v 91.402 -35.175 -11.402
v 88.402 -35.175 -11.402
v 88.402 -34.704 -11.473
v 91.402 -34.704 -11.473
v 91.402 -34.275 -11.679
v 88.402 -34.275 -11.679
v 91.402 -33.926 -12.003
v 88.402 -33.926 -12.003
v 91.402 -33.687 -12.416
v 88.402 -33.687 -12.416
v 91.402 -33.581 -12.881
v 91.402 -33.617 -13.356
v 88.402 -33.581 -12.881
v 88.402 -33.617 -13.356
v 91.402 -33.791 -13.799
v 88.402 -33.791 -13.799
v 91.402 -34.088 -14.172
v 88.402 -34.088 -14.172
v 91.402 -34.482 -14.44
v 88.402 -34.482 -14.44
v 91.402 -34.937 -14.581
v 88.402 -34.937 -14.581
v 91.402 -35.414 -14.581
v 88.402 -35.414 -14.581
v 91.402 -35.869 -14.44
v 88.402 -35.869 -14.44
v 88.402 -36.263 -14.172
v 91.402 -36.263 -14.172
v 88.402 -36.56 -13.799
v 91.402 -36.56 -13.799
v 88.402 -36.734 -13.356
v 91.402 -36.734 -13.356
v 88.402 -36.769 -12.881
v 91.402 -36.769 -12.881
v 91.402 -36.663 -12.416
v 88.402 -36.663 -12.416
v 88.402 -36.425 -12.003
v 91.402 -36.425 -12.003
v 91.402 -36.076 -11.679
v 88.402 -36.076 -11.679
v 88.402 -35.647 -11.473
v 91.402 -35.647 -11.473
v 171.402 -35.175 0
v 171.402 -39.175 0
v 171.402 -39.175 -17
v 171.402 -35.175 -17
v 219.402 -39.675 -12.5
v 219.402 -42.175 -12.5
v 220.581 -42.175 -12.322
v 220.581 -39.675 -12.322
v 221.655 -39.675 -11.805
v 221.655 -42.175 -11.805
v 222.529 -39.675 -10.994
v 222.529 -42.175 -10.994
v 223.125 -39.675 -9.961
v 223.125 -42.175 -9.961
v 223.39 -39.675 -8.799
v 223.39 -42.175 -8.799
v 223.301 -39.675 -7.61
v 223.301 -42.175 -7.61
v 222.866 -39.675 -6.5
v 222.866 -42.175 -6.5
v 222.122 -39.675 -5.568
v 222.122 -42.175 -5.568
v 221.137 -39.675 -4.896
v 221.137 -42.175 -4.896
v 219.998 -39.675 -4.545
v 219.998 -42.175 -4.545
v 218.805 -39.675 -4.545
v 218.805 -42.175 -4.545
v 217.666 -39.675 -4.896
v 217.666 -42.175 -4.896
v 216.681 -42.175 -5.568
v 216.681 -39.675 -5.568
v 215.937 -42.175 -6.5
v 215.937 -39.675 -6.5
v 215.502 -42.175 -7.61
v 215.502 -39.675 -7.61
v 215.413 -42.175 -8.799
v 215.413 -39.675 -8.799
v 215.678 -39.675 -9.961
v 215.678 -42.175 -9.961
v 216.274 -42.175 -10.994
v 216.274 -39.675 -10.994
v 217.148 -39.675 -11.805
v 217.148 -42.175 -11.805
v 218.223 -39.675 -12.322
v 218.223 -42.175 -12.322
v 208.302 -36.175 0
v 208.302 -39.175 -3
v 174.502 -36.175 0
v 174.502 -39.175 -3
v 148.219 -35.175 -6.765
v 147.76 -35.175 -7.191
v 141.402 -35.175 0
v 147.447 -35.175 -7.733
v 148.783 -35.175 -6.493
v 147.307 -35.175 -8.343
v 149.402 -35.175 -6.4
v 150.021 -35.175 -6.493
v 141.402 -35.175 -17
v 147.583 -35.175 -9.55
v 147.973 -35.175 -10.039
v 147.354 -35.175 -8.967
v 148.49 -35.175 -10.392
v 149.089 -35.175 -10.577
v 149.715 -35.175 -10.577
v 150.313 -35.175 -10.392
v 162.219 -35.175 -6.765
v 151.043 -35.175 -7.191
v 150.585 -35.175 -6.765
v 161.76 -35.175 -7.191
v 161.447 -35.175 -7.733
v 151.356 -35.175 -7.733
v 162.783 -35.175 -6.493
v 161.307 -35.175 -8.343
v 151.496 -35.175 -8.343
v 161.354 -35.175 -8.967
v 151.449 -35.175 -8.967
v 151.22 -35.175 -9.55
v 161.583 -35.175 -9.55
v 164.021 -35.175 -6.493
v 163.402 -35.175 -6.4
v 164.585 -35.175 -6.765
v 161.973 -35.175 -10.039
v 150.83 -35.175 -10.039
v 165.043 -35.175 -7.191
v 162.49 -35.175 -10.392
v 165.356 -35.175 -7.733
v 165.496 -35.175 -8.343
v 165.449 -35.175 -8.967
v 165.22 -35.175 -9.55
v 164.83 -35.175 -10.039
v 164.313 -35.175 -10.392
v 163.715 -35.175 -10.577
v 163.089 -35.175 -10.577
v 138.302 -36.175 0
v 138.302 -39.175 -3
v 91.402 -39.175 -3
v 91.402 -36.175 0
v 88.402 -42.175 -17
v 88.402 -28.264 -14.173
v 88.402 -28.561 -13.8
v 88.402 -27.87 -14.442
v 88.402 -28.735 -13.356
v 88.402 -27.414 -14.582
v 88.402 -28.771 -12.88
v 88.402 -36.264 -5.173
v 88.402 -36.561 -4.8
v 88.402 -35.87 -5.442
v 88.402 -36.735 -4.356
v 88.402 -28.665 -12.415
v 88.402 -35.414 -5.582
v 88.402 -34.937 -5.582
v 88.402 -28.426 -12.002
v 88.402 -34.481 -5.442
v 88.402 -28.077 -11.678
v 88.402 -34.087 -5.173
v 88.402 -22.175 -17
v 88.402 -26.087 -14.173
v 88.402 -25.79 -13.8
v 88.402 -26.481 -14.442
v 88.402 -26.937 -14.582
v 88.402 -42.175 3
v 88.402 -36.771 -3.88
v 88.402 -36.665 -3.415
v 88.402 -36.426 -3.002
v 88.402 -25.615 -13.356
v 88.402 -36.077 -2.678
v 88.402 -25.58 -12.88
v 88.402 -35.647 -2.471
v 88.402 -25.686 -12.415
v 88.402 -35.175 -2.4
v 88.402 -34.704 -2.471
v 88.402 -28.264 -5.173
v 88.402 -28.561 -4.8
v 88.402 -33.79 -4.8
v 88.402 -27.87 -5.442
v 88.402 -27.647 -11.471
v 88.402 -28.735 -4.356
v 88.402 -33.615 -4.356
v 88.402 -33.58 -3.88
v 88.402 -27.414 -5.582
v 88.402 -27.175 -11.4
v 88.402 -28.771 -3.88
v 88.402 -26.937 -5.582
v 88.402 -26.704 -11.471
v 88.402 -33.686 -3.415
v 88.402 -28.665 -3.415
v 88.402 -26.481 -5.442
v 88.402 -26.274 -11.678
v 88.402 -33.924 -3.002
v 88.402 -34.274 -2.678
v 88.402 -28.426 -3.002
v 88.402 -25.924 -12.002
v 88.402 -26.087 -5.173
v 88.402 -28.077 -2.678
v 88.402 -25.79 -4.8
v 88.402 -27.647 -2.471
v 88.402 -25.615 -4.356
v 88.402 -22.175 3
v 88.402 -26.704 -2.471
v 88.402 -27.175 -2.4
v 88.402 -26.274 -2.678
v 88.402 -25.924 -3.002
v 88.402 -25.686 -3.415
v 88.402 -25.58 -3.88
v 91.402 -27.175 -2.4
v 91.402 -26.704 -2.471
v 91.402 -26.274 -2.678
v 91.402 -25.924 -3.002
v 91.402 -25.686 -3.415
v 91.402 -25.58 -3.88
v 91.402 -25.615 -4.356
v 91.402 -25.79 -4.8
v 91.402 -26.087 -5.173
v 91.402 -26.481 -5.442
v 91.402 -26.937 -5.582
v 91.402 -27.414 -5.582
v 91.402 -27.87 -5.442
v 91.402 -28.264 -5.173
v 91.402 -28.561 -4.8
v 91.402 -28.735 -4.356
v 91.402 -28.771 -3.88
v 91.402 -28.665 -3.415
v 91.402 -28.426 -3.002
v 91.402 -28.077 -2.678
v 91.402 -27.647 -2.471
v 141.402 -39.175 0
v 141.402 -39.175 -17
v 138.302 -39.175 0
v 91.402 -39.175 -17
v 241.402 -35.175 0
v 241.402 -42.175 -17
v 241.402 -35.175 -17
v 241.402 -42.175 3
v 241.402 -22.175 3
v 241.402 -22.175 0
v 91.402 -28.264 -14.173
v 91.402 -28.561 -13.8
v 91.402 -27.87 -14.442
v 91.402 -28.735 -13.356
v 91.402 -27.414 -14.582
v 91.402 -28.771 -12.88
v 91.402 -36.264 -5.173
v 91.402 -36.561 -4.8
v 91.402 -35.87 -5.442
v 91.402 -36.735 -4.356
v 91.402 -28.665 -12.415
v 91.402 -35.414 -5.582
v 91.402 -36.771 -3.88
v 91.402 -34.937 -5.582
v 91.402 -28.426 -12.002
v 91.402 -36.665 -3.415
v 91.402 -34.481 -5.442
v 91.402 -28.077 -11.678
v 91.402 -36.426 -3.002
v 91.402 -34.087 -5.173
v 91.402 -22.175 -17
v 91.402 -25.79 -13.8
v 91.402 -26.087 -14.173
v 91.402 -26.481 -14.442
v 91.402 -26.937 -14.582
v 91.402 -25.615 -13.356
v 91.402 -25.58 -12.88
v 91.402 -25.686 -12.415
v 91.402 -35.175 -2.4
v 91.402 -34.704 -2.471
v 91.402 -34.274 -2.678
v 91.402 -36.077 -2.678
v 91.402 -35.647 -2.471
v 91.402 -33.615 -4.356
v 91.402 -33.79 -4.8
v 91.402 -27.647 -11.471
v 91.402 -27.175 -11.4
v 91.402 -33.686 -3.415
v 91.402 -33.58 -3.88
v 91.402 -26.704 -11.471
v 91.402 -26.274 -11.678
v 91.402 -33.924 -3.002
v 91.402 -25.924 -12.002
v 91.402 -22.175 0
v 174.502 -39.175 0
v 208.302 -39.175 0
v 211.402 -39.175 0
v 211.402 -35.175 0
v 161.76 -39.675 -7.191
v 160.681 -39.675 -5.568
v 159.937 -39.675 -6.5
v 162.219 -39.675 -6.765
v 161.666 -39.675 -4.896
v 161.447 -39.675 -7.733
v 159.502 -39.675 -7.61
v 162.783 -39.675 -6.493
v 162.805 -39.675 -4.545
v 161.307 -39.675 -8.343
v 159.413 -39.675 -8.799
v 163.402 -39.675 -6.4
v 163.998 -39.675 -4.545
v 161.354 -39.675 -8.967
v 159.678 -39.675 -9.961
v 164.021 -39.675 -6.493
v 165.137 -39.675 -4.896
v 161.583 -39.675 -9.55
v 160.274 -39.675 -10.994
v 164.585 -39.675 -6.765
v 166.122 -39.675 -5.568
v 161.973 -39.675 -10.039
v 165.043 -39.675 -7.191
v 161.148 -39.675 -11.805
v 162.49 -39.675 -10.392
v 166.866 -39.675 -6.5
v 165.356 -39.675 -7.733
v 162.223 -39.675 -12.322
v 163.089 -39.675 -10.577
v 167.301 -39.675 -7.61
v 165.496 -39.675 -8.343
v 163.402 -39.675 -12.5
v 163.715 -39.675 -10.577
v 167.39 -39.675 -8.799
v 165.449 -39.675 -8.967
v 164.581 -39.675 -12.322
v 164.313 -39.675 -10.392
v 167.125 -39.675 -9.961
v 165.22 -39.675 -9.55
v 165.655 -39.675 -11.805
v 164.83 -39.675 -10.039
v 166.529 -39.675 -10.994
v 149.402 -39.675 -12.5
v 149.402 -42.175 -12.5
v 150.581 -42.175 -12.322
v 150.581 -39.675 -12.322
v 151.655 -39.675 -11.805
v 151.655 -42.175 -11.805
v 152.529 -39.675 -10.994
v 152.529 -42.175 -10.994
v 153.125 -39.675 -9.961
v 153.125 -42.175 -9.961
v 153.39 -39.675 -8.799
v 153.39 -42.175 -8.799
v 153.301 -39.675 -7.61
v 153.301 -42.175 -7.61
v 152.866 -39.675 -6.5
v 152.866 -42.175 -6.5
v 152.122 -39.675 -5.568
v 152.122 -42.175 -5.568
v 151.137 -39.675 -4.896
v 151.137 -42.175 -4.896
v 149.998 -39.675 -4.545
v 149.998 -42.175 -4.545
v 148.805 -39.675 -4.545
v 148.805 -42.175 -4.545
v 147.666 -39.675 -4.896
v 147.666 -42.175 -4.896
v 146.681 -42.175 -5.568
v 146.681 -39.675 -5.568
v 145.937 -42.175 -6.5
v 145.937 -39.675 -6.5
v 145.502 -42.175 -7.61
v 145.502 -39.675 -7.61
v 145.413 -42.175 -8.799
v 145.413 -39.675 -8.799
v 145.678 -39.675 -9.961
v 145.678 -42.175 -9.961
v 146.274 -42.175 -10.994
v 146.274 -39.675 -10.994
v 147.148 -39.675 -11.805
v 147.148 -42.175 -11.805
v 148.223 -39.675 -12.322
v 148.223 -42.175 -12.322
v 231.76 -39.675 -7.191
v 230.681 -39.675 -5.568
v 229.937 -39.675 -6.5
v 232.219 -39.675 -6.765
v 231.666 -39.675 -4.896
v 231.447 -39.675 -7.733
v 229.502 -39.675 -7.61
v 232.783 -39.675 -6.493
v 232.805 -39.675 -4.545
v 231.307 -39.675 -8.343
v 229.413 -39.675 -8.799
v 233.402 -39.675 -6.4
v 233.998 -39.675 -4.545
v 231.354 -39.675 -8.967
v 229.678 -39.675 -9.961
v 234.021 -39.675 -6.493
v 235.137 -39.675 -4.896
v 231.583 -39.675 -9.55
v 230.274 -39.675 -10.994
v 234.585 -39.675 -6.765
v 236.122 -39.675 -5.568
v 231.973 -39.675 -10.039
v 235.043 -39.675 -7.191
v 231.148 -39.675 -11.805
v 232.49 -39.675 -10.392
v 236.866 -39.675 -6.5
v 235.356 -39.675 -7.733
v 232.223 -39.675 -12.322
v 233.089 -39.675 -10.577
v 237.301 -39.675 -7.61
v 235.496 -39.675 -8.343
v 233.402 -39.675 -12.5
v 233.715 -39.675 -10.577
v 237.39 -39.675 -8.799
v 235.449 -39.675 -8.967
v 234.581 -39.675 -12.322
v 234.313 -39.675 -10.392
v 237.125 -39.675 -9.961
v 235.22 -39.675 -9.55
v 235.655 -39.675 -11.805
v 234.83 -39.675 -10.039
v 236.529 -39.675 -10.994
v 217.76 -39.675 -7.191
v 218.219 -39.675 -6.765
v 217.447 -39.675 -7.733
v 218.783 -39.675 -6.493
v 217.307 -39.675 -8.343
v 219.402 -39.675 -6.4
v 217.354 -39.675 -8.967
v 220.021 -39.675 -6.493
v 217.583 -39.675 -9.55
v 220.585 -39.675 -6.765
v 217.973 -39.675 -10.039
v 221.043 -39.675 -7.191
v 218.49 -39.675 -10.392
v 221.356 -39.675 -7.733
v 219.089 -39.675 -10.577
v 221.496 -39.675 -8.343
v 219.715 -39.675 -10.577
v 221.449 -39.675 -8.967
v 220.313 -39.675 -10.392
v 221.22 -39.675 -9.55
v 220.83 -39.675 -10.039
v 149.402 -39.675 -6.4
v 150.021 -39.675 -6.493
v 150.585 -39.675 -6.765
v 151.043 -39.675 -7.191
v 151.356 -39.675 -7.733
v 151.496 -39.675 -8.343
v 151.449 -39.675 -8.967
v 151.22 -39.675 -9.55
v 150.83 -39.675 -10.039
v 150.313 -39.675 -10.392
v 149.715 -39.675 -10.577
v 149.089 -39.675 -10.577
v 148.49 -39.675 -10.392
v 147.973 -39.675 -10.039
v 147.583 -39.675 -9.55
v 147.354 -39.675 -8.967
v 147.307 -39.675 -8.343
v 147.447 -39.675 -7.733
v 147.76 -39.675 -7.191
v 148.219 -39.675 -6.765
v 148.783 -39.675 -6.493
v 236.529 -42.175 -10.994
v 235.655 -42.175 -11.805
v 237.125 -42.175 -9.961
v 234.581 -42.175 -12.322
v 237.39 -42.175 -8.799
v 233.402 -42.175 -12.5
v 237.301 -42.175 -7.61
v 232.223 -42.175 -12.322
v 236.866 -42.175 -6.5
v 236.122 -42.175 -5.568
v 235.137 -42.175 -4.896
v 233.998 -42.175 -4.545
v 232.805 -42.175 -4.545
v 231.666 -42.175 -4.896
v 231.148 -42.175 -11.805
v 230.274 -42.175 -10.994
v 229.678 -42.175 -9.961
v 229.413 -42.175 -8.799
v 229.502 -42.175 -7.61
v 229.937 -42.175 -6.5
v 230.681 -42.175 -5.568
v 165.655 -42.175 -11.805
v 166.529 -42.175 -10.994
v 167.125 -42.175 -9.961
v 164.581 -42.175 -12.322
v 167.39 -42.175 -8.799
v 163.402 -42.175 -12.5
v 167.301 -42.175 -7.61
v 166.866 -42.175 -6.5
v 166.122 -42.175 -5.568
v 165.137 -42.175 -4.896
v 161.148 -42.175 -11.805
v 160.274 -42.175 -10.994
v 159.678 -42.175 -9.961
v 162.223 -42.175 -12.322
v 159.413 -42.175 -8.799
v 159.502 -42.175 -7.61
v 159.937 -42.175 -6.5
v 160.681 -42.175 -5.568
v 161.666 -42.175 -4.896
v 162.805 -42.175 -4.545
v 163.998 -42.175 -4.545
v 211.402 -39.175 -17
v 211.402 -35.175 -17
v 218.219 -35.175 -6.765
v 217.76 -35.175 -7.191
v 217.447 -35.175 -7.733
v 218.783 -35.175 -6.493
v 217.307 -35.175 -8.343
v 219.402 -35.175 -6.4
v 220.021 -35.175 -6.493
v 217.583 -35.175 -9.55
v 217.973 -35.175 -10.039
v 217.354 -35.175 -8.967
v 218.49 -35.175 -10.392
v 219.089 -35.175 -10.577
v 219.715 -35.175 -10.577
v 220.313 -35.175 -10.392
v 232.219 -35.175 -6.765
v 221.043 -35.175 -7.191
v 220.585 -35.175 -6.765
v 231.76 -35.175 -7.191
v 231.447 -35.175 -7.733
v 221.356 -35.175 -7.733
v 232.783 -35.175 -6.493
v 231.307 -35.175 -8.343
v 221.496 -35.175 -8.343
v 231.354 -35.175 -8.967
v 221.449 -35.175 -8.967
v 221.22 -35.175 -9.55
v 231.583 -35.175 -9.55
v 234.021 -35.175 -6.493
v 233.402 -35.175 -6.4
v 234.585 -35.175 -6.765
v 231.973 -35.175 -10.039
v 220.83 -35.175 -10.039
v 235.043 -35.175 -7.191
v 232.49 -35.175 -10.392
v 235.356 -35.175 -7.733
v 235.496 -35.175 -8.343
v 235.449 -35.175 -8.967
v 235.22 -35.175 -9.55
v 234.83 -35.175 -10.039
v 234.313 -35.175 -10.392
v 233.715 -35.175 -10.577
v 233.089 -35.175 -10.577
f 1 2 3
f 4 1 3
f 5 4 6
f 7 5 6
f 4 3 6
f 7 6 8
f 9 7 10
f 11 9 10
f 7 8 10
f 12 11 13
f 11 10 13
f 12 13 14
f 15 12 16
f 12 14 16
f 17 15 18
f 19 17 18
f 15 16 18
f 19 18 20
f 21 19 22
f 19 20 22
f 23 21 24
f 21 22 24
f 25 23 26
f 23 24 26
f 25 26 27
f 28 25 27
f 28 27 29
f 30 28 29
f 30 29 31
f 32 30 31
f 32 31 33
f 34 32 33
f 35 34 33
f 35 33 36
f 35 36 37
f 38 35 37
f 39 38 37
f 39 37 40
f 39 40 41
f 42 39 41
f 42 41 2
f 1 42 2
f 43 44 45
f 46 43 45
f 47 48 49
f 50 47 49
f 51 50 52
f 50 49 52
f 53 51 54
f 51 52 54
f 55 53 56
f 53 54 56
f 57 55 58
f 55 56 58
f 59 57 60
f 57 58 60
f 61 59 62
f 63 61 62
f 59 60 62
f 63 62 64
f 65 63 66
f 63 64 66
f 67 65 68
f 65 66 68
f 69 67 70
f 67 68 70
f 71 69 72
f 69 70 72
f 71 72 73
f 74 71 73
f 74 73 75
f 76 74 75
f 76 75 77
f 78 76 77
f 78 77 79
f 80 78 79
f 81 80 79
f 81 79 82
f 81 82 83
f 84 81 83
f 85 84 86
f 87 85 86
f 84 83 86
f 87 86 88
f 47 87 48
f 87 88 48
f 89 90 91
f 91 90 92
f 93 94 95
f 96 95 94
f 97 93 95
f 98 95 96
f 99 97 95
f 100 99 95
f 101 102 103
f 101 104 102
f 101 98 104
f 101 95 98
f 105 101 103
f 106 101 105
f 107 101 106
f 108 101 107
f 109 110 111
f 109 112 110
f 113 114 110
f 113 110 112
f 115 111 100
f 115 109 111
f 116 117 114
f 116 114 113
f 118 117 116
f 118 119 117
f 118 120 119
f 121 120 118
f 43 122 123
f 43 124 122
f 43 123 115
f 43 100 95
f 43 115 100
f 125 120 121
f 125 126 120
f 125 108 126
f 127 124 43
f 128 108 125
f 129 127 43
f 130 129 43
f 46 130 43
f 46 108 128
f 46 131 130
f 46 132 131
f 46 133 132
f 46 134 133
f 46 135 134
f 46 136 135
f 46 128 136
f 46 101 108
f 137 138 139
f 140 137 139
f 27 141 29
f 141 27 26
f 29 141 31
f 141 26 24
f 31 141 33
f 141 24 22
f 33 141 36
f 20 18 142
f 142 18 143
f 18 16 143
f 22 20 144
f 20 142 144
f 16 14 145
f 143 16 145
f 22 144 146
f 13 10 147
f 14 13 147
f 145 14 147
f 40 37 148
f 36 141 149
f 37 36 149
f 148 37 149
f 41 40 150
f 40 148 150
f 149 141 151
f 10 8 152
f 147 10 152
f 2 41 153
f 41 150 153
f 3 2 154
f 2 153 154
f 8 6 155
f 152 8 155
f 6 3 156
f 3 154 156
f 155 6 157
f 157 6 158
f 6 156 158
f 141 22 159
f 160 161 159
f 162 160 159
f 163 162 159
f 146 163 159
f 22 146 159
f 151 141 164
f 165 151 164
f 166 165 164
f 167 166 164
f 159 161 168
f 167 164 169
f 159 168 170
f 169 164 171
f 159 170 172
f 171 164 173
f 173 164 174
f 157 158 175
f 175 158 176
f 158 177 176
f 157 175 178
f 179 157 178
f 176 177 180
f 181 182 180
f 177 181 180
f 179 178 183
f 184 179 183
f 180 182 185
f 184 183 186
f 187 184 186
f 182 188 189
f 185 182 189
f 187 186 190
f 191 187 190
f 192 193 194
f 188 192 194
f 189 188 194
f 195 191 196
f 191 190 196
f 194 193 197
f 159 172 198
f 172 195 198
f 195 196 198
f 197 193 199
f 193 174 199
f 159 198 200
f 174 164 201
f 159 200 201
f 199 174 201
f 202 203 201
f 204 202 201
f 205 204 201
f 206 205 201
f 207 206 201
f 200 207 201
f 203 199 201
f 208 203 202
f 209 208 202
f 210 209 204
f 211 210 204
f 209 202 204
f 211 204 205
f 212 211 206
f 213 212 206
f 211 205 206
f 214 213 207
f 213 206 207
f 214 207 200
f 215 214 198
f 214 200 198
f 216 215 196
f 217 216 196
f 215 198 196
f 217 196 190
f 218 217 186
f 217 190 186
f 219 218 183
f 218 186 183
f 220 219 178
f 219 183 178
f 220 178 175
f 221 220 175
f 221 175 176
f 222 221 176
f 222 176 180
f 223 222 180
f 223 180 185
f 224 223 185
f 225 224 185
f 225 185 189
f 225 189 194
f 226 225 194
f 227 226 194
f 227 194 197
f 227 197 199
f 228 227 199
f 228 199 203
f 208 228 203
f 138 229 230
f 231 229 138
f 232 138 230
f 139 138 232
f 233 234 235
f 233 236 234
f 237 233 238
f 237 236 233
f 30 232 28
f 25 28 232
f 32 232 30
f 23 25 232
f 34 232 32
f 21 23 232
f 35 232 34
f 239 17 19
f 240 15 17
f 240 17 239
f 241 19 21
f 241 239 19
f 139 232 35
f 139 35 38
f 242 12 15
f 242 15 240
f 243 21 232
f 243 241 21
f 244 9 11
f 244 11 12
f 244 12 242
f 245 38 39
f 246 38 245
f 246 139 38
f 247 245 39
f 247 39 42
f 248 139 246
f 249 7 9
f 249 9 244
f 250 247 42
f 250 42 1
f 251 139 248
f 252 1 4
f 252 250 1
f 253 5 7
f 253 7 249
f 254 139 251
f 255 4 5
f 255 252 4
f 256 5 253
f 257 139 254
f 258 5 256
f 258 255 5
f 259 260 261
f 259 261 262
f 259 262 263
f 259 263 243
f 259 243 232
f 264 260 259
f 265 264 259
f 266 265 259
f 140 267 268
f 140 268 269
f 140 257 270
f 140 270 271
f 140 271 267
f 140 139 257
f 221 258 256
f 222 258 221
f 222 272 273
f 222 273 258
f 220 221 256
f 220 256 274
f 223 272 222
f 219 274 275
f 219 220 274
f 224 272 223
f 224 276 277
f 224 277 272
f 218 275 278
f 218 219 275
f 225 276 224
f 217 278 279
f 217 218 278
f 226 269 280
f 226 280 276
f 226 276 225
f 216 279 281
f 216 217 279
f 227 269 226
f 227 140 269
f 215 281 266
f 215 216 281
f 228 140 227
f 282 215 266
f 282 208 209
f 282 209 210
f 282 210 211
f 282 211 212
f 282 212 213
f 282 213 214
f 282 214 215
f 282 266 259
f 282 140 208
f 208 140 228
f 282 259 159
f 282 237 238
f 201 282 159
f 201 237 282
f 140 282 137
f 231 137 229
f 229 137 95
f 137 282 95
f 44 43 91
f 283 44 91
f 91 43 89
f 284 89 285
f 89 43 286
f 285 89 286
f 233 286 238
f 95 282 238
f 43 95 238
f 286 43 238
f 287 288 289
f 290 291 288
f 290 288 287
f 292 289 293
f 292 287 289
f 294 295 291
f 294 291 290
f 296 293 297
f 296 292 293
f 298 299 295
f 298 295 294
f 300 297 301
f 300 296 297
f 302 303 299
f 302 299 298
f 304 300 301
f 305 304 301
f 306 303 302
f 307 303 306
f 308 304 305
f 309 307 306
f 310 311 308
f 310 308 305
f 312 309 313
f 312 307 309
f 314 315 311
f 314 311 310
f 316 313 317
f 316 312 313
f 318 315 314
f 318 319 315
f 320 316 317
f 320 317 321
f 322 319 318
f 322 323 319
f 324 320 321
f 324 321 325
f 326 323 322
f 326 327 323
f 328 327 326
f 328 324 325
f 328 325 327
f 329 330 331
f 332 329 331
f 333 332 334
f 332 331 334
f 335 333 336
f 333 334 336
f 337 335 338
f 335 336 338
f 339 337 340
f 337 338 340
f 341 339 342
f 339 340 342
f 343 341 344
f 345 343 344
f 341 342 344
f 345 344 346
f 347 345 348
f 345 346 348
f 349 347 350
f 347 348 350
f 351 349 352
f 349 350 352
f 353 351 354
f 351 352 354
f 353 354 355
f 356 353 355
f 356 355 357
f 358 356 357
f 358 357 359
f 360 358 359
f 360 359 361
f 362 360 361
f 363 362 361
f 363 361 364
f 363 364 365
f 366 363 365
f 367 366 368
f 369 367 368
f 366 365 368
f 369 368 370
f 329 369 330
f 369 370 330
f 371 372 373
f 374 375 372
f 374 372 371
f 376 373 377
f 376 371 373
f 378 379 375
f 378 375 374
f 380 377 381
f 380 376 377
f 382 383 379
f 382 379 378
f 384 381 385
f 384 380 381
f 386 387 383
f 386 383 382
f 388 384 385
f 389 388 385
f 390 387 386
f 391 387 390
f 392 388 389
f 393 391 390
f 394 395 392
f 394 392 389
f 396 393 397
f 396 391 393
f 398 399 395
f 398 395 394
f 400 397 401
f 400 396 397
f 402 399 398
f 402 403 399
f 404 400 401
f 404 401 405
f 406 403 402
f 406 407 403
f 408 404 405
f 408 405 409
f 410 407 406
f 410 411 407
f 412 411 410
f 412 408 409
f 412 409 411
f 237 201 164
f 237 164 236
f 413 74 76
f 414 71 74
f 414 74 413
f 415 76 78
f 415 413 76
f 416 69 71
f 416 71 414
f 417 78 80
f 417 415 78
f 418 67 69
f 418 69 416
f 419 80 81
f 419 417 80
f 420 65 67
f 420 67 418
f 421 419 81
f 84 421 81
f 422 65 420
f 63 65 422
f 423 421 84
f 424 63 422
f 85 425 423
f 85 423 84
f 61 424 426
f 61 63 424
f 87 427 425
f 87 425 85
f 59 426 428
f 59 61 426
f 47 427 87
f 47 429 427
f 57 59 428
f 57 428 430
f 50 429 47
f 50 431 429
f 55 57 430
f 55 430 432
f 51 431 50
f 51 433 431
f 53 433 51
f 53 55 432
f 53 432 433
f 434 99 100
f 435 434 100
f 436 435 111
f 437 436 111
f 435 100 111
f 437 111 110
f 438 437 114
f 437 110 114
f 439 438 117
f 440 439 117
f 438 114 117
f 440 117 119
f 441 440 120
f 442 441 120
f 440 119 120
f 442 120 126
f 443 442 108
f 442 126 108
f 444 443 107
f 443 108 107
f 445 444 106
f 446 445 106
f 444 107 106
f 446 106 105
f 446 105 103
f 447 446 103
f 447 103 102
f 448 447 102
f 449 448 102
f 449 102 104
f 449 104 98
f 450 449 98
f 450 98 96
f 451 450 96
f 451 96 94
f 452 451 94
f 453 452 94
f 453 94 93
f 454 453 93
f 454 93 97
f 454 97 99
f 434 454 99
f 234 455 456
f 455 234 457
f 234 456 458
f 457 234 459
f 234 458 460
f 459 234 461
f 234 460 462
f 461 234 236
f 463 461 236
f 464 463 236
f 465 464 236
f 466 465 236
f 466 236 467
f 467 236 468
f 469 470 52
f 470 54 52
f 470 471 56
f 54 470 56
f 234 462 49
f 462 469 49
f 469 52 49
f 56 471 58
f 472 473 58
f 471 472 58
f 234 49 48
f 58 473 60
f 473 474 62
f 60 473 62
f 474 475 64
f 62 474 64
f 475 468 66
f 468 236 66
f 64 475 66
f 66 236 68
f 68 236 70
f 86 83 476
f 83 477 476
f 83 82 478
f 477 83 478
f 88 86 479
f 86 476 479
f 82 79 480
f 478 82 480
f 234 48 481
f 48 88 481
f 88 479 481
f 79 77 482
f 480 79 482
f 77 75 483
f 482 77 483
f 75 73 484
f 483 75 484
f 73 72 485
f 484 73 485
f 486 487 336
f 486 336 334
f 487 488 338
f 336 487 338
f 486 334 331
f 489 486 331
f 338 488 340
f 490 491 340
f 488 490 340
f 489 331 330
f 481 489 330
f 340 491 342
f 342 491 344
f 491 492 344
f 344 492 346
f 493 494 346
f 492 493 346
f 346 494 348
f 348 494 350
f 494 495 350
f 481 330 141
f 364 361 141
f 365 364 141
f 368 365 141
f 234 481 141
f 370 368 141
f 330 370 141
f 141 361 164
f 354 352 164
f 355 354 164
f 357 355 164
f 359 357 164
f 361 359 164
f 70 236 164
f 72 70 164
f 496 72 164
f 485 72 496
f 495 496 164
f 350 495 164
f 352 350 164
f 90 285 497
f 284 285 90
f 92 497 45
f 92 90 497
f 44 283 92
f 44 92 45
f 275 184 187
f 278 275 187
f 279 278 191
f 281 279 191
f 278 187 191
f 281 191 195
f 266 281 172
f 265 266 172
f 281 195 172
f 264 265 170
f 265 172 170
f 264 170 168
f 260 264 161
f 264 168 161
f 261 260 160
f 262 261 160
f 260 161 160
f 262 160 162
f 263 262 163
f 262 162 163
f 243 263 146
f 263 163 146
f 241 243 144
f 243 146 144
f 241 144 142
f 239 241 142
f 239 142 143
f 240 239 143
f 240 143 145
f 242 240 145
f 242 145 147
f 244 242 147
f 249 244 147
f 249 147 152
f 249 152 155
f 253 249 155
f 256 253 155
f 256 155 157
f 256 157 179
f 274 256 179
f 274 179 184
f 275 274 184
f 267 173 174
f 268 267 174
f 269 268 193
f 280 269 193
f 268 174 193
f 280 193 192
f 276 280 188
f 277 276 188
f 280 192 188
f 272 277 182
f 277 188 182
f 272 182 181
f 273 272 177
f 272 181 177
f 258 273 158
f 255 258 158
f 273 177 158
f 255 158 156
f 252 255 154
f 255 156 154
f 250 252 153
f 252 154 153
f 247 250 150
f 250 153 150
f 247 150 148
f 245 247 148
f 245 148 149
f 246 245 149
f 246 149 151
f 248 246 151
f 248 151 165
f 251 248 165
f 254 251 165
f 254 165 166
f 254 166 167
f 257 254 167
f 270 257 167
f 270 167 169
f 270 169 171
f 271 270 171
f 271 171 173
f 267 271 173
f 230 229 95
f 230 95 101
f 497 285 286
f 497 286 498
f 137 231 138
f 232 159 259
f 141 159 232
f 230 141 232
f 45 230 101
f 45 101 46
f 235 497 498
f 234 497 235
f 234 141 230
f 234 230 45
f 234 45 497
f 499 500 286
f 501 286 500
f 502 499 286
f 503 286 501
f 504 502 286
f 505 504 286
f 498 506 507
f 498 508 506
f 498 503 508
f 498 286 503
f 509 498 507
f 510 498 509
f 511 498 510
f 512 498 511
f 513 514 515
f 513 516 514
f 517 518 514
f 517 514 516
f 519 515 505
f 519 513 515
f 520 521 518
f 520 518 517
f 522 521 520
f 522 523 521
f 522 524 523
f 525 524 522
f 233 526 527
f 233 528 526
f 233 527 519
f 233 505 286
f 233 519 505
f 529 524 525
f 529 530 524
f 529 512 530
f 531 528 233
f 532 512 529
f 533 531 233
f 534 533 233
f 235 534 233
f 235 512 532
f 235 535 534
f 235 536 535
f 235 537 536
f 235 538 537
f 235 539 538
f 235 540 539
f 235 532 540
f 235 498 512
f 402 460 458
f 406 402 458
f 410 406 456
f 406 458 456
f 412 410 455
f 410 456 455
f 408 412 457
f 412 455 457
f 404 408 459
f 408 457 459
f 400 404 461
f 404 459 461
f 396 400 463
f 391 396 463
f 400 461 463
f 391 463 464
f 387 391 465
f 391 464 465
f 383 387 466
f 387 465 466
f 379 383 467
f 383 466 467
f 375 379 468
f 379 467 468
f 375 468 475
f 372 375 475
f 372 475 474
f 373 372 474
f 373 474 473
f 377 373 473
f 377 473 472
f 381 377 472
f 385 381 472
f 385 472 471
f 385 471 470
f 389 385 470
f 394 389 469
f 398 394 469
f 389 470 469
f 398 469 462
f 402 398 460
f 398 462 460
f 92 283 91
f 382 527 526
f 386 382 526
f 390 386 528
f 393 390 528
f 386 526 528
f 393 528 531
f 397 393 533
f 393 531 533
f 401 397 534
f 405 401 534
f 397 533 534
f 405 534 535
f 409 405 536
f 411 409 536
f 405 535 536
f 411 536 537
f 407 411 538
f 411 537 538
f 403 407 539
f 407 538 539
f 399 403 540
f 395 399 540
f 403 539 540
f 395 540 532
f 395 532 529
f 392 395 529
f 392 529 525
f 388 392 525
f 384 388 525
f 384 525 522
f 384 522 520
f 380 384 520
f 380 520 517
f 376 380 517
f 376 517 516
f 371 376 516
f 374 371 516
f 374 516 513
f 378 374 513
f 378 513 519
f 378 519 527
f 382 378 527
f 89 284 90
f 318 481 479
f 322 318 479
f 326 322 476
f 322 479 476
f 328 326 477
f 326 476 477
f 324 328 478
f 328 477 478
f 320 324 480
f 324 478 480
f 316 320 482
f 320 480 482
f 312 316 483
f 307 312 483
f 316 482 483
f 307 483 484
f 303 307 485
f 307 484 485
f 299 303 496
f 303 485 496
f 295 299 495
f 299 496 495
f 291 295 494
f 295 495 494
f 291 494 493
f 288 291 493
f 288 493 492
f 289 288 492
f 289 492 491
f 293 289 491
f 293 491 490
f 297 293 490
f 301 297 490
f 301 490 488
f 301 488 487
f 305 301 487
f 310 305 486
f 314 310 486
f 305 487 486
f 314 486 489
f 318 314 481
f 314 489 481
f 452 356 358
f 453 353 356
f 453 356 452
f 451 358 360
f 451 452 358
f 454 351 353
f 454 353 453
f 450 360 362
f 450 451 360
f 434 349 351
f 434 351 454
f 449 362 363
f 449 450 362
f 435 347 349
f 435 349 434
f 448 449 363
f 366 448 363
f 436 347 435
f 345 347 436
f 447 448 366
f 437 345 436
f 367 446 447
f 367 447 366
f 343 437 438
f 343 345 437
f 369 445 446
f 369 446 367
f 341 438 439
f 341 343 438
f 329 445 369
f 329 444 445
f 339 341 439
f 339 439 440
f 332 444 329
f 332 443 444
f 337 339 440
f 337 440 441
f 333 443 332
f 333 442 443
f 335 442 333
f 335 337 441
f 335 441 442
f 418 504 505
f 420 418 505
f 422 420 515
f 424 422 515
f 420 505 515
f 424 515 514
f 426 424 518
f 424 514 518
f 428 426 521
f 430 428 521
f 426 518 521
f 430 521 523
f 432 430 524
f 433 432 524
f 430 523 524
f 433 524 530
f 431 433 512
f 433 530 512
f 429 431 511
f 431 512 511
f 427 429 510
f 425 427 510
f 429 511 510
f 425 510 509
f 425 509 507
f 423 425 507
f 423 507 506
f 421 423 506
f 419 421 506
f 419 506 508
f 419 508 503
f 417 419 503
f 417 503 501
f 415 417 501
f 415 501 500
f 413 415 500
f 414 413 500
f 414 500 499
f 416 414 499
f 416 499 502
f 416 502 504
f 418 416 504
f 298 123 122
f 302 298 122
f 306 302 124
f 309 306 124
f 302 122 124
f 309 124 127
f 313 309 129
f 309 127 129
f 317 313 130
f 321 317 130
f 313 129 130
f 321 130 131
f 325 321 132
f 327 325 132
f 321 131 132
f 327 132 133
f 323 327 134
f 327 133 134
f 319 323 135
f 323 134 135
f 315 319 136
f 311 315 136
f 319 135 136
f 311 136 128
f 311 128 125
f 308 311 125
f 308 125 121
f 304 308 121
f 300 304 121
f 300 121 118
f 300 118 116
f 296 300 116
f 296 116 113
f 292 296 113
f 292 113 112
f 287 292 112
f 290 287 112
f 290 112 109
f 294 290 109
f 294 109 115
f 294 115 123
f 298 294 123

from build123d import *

# Parameters (mm, degrees)
SKETCH1_W           = 153
SKETCH1_H           = 20
BOSS_EXTRUDE1_DEPTH = 3
SKETCH2_W           = 3
SKETCH2_H           = 20
BOSS_EXTRUDE2_DEPTH = 17
SKETCH3_W           = 150
SKETCH3_H           = 3
BOSS_EXTRUDE3_DEPTH = 17
SKETCH4_R           = 1.6
SKETCH4_R_2         = 1.598435099
CUT_EXTRUDE1_DEPTH  = 10
SKETCH6_W           = 30
SKETCH6_H           = 17
BOSS_EXTRUDE4_DEPTH = 4
SKETCH7_R           = 2.1
CUT_EXTRUDE3_DEPTH  = 243.348358538
SKETCH8_R           = 4
CUT_EXTRUDE4_DEPTH  = 2.5
SKETCH9_W           = 30
SKETCH9_H           = 17
BOSS_EXTRUDE5_DEPTH = 4
SKETCH12_R          = 2.1
CUT_EXTRUDE7_DEPTH  = 243.348358538
SKETCH13_R          = 4
CUT_EXTRUDE8_DEPTH  = 2.5
CHAMFER9_SIZE       = 3
SKETCH15_W          = 3.1
SKETCH15_H          = 17
CUT_EXTRUDE10_DEPTH = 3


with BuildPart() as part:
    # Sketch1 → Boss-Extrude1 (new body)
    with BuildSketch(Plane.XY):
        with Locations((164.901588409, -32.175360178)):
            Rectangle(SKETCH1_W, SKETCH1_H)
    extrude(amount=BOSS_EXTRUDE1_DEPTH)

    # Sketch2 → Boss-Extrude2 (add)
    with BuildSketch(Plane(origin=(0, 0, 0), x_dir=(-1, 0, 0), z_dir=(0, 0, -1))):
        with Locations((-89.901588409, -32.175360178)):
            Rectangle(SKETCH2_W, SKETCH2_H)
    extrude(amount=BOSS_EXTRUDE2_DEPTH)

    # Sketch3 → Boss-Extrude3 (add)
    with BuildSketch(Plane(origin=(0, 0, 0), x_dir=(-1, 0, 0), z_dir=(0, 0, -1))):
        with Locations((-166.401588409, -40.675360178)):
            Rectangle(SKETCH3_W, SKETCH3_H)
    extrude(amount=BOSS_EXTRUDE3_DEPTH)

    # Sketch4 → Cut-Extrude1 (cut)
    with BuildSketch(Plane.ZY.offset(-88.401588409)):
        with Locations((-13, -27.175360178)):
            Circle(SKETCH4_R)
        with Locations((-4, -27.175360178)):
            Circle(SKETCH4_R)
        with Locations((-4, -35.175360178)):
            Circle(SKETCH4_R)
        with Locations((-13, -35.175360178)):
            Circle(SKETCH4_R_2)
    extrude(amount=-CUT_EXTRUDE1_DEPTH, mode=Mode.SUBTRACT)

    # Sketch6 → Boss-Extrude4 (add)
    with BuildSketch(Plane(origin=(0, -39.175360178, 0), x_dir=(1, 0, 0), z_dir=(0, 1, 0))):
        with Locations((226.401588409, 8.5)):
            Rectangle(SKETCH6_W, SKETCH6_H)
    extrude(amount=BOSS_EXTRUDE4_DEPTH)

    # Sketch7 → Cut-Extrude3 (cut, through all)
    with BuildSketch(Plane(origin=(0, -35.175360178, 0), x_dir=(1, 0, 0), z_dir=(0, 1, 0))):
        with Locations(Location((219.401588409, 8.5, 0), (0, 0, 270))):
            Circle(SKETCH7_R)
        with Locations(Location((233.401588409, 8.5, 0), (0, 0, 270))):
            Circle(SKETCH7_R)
    extrude(amount=-CUT_EXTRUDE3_DEPTH, mode=Mode.SUBTRACT)

    # Sketch8 → Cut-Extrude4 (cut)
    with BuildSketch(Plane.XZ.offset(42.175360178)):
        with Locations(Location((219.401588409, -8.5, 0), (0, 0, 270))):
            Circle(SKETCH8_R)
        with Locations(Location((233.401588409, -8.5, 0), (0, 0, 270))):
            Circle(SKETCH8_R)
    extrude(amount=-CUT_EXTRUDE4_DEPTH, mode=Mode.SUBTRACT)

    # Sketch9 → Boss-Extrude5 (add)
    with BuildSketch(Plane(origin=(0, -39.175360178, 0), x_dir=(1, 0, 0), z_dir=(0, 1, 0))):
        with Locations((156.401588409, 8.5)):
            Rectangle(SKETCH9_W, SKETCH9_H)
    extrude(amount=BOSS_EXTRUDE5_DEPTH)

    # Sketch12 → Cut-Extrude7 (cut, through all)
    with BuildSketch(Plane(origin=(0, -35.175360178, 0), x_dir=(1, 0, 0), z_dir=(0, 1, 0))):
        with Locations(Location((163.401588409, 8.5, 0), (0, 0, 270))):
            Circle(SKETCH12_R)
        with Locations(Location((149.401588409, 8.5, 0), (0, 0, 270))):
            Circle(SKETCH12_R)
    extrude(amount=-CUT_EXTRUDE7_DEPTH, mode=Mode.SUBTRACT)

    # Sketch13 → Cut-Extrude8 (cut)
    with BuildSketch(Plane.XZ.offset(42.175360178)):
        with Locations(Location((163.401588409, -8.5, 0), (0, 0, 270))):
            Circle(SKETCH13_R)
        with Locations(Location((149.401588409, -8.5, 0), (0, 0, 270))):
            Circle(SKETCH13_R)
    extrude(amount=-CUT_EXTRUDE8_DEPTH, mode=Mode.SUBTRACT)

    # Chamfer9
    chamfer9_edges = [part.edges().sort_by_distance(p)[0] for p in [
        (116.401588409, -39.175360178, 0),
        (191.401588409, -39.175360178, 0),
    ]]
    chamfer(chamfer9_edges, length=CHAMFER9_SIZE)

    # Sketch15 → Cut-Extrude10 (cut)
    with BuildSketch(Plane(origin=(0, -39.175360178, 0), x_dir=(1, 0, 0), z_dir=(0, 1, 0))):
        with Locations((209.851588409, 8.5)):
            Rectangle(SKETCH15_W, SKETCH15_H)
        with Locations((172.951588409, 8.5)):
            Rectangle(SKETCH15_W, SKETCH15_H)
        with Locations((139.851588409, 8.5)):
            Rectangle(SKETCH15_W, SKETCH15_H)
    extrude(amount=CUT_EXTRUDE10_DEPTH, mode=Mode.SUBTRACT)


solid = part.part
